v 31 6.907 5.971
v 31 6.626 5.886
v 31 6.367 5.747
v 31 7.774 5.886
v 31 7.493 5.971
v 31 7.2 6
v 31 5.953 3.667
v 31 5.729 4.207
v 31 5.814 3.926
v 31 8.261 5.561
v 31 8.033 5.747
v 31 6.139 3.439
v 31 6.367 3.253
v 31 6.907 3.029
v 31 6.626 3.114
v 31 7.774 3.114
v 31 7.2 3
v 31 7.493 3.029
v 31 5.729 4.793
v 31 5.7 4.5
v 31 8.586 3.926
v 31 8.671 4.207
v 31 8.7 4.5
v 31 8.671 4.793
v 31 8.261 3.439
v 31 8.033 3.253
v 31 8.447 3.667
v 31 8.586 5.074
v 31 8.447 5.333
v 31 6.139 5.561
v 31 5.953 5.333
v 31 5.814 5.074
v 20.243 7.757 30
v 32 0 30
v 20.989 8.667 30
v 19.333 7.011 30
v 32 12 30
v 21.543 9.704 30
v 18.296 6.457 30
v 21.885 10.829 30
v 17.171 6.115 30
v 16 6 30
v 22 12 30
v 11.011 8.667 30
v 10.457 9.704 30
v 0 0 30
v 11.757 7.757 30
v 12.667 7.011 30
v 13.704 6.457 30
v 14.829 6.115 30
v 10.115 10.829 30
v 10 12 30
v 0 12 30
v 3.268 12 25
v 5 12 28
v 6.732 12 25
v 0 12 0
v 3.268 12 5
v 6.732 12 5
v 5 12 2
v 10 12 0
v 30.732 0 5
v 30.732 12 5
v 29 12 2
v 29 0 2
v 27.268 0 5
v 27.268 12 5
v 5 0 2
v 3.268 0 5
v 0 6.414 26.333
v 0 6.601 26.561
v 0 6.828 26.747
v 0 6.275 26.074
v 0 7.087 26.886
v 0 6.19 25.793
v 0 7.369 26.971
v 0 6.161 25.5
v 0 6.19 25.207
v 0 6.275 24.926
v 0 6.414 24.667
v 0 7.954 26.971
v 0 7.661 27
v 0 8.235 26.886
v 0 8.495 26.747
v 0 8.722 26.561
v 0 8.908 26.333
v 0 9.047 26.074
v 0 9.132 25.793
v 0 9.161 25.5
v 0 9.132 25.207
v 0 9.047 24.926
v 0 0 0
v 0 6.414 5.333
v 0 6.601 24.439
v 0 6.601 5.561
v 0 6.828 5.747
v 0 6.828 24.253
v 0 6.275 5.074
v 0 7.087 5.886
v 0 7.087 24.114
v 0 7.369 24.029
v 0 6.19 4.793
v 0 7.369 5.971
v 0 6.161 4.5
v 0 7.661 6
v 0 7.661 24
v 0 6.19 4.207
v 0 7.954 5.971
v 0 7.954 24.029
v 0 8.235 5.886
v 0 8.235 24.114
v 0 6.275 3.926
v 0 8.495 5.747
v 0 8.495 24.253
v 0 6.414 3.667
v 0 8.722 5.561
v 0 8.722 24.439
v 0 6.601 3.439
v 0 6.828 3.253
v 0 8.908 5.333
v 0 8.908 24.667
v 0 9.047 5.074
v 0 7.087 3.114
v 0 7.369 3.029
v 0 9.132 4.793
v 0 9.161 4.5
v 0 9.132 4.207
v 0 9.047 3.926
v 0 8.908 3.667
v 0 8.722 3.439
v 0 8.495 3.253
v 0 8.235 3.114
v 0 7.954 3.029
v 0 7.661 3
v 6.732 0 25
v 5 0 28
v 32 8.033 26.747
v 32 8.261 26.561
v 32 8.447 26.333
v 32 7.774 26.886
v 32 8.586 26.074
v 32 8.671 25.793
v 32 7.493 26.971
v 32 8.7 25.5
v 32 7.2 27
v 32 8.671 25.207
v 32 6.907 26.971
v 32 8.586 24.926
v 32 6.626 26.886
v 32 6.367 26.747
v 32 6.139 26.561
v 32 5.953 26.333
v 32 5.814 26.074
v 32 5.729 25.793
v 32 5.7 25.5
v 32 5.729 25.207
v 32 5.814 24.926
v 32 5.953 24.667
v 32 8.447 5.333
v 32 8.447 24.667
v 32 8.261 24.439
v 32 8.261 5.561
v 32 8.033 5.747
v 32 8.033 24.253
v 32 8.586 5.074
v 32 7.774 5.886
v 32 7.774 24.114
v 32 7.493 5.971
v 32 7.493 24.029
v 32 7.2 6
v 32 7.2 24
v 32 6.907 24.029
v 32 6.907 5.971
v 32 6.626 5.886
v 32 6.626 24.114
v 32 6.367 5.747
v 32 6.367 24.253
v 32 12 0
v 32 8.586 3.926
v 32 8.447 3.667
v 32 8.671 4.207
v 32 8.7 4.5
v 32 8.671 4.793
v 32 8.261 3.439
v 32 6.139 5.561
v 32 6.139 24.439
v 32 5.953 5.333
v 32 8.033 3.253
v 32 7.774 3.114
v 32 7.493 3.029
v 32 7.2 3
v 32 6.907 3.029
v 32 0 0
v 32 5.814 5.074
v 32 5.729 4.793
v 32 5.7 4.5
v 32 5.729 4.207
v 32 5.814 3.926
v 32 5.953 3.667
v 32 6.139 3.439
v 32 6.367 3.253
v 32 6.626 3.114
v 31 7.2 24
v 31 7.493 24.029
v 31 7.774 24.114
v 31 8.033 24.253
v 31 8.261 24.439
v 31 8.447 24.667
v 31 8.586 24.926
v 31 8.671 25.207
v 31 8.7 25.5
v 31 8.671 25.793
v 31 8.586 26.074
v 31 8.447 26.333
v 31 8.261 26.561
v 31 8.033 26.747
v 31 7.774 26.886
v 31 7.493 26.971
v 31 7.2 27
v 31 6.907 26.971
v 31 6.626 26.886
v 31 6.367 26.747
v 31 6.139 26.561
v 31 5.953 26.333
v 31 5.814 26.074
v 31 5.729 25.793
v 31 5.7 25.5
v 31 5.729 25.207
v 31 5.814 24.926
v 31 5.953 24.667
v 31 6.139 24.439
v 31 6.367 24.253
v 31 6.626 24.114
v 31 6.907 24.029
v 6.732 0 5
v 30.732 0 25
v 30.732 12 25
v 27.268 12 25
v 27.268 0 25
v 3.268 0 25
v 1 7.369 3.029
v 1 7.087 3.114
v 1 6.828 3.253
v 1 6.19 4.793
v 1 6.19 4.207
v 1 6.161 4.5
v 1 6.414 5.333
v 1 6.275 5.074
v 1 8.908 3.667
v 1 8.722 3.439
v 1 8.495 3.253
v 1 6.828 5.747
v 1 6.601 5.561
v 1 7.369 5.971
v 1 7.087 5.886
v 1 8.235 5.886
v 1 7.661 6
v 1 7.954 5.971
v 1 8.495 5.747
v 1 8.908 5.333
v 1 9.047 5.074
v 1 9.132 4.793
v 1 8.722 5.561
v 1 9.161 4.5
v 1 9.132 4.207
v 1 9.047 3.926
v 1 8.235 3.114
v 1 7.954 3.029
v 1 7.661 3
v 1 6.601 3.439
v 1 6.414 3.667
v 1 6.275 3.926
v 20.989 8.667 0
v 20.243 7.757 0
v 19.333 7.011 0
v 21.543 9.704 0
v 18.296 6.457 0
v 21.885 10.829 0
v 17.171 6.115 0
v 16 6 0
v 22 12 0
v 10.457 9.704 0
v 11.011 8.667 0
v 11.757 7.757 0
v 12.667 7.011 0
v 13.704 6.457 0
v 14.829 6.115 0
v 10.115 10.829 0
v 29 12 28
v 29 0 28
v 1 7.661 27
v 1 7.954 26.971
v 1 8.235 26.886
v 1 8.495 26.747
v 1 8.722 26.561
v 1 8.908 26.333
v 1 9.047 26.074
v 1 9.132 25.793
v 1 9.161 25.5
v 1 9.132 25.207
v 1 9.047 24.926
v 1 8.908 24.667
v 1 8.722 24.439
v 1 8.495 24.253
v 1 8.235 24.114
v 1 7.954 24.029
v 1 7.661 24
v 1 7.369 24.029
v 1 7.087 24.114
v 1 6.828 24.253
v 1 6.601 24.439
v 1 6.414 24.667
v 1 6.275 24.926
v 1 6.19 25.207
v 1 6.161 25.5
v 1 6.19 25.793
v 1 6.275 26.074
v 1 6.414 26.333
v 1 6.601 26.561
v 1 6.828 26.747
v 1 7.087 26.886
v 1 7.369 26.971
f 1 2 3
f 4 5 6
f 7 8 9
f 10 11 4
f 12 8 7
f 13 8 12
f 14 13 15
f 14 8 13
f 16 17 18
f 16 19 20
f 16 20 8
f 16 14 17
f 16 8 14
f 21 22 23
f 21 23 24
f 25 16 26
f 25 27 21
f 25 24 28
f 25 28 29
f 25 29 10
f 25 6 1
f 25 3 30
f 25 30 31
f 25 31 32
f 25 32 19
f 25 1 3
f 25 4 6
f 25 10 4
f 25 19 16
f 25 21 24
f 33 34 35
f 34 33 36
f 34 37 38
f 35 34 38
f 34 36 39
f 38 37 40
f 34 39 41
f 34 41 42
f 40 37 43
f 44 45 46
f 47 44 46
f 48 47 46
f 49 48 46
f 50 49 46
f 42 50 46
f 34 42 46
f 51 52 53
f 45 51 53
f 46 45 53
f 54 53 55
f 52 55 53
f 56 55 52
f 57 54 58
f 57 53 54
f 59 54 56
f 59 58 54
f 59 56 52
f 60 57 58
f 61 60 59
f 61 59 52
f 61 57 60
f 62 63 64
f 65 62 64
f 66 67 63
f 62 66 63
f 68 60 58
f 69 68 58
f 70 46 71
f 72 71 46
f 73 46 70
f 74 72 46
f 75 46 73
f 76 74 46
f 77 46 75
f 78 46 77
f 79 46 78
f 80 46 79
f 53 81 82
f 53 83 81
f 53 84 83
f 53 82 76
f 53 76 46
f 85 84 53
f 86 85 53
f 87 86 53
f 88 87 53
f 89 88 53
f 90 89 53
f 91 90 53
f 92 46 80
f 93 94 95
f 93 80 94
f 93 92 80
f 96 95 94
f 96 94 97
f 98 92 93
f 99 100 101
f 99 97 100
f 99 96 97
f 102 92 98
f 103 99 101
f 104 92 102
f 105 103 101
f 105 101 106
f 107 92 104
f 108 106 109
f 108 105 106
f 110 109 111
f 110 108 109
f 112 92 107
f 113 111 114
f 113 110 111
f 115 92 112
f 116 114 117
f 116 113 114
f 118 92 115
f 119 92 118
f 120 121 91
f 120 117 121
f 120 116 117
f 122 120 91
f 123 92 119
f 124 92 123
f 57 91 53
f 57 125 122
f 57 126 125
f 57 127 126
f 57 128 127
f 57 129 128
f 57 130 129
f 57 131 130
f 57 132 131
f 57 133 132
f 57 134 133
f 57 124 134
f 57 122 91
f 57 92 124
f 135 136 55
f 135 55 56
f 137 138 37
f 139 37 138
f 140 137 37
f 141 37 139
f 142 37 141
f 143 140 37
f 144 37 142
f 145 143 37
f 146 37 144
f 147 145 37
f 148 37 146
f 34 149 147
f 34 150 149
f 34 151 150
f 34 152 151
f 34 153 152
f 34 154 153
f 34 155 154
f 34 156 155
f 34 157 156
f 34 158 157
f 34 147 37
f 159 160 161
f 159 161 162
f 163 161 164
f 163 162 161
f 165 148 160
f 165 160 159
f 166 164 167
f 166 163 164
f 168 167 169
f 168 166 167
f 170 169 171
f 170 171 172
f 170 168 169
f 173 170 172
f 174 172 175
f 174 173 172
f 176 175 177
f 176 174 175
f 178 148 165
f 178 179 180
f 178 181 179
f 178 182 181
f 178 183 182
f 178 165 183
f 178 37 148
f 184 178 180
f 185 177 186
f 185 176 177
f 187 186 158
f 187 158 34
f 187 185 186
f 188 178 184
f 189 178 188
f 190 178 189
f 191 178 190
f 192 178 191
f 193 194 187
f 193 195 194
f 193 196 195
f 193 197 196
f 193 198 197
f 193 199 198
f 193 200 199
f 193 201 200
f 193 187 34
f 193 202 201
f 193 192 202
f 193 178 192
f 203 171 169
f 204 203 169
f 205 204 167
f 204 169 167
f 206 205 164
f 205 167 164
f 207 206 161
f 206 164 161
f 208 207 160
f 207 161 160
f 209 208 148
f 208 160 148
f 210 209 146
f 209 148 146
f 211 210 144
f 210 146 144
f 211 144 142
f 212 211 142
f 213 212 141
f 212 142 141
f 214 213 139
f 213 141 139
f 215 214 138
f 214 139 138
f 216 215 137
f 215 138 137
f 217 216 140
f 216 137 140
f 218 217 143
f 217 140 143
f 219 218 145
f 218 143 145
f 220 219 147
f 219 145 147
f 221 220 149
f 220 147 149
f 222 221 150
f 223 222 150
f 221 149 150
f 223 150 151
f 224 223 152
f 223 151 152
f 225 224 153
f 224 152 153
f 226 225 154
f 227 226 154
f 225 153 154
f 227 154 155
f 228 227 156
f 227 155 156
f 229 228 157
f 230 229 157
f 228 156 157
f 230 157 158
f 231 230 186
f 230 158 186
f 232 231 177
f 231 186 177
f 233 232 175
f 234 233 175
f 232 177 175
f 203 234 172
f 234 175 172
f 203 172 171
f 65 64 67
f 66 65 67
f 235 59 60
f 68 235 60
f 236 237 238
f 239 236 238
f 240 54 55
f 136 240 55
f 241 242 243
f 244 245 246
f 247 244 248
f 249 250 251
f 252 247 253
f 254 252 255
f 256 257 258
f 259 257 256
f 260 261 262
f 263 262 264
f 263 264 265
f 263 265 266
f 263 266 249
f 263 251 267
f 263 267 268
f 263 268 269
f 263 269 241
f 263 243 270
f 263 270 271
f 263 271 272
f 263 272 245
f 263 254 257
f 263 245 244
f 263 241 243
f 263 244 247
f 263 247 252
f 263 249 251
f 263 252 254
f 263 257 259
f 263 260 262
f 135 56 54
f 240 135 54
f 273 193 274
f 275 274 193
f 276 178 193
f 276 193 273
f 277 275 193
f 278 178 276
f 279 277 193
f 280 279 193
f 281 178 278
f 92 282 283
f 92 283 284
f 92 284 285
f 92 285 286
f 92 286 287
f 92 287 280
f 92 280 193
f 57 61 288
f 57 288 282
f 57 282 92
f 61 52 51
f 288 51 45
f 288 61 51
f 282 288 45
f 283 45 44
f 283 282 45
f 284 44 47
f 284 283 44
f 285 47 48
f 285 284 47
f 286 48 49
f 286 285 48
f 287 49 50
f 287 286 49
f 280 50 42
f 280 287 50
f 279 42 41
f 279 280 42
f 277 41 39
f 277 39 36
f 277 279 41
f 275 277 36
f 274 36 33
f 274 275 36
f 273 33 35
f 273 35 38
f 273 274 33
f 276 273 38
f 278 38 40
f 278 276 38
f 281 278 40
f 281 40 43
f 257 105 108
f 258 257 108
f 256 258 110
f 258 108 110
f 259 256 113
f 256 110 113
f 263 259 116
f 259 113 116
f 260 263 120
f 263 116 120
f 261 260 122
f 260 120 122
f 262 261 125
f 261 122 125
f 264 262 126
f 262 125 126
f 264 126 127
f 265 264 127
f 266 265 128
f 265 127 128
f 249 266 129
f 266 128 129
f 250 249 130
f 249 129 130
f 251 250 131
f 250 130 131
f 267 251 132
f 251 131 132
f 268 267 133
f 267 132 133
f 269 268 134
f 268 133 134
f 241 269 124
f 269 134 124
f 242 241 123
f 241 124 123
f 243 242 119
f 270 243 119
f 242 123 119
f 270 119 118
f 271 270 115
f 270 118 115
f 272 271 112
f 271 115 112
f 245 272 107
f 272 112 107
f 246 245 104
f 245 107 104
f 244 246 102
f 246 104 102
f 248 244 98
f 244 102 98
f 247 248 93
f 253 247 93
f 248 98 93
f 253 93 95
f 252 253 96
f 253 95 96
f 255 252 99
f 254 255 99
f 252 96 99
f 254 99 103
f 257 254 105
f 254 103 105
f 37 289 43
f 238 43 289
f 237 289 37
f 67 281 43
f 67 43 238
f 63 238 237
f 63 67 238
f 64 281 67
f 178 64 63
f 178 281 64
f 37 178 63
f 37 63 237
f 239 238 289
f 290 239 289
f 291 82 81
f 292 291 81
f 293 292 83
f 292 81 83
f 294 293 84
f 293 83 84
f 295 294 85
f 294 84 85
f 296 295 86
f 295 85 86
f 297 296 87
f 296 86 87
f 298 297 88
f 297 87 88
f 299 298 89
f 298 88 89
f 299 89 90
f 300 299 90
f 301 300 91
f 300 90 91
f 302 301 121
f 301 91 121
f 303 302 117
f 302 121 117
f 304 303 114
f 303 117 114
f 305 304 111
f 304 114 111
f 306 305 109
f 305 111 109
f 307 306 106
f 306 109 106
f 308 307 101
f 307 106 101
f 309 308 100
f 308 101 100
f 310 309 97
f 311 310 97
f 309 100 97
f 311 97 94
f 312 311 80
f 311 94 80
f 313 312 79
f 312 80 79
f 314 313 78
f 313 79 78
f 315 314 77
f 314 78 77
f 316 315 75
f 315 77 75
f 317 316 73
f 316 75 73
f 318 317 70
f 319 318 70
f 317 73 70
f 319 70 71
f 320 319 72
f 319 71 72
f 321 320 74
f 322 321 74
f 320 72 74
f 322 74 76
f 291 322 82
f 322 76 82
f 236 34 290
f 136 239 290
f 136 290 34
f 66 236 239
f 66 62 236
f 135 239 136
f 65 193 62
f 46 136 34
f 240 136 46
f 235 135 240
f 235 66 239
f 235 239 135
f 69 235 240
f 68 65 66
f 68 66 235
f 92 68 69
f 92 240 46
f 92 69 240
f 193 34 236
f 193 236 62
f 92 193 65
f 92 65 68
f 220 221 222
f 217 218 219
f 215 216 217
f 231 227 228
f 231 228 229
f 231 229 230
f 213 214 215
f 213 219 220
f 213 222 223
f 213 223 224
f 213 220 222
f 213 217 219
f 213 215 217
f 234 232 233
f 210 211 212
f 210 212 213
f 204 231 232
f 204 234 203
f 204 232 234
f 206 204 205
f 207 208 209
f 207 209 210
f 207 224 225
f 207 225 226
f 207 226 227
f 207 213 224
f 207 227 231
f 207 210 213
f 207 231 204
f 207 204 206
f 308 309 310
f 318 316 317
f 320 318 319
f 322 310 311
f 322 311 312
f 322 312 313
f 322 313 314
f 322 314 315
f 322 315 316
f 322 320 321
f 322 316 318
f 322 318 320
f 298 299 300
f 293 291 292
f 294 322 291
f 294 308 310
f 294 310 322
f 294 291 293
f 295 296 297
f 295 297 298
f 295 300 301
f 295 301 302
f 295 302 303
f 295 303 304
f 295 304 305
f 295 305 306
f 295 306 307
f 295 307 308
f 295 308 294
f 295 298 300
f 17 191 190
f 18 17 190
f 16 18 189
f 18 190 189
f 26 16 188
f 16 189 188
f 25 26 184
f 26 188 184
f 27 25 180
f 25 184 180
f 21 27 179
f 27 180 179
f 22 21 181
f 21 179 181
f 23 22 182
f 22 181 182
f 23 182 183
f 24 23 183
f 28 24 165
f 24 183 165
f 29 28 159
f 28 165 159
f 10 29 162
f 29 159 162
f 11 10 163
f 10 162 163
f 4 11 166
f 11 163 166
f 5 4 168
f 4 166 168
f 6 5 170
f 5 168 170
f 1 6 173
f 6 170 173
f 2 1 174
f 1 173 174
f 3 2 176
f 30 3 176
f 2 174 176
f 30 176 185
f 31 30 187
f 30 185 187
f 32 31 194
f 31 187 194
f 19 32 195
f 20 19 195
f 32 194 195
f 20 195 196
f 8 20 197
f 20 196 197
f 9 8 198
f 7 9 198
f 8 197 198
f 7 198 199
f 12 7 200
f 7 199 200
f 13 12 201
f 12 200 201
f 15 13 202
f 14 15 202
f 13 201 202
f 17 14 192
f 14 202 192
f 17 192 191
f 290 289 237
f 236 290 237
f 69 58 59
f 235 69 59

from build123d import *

# Parameters (mm, degrees)
BOSS_EXTRUDE1_DEPTH = 30
CUT_EXTRUDE1_DEPTH  = 13
SKETCH5_R           = 1.5
CUT_EXTRUDE2_DEPTH  = 1
SKETCH6_R           = 1.5
CUT_EXTRUDE3_DEPTH  = 1


with BuildPart() as part:
    # Sketch1 → Boss-Extrude1 (new body)
    with BuildSketch(Plane.XY):
        with BuildLine():
            Line((0, 0), (0, 12))
            Line((0, 12), (10, 12))
            ThreePointArc((10, 12), (16, 6), (22, 12))
            Line((22, 12), (32, 12))
            Line((32, 12), (32, 0))
            Line((32, 0), (0, 0))
        make_face()
    extrude(amount=BOSS_EXTRUDE1_DEPTH)

    # Sketch4 → Cut-Extrude1 (cut, through all)
    with BuildSketch(Plane(origin=(0, 12, 0), x_dir=(1, 0, 0), z_dir=(0, 1, 0))):
        Polygon((5, -2), (3.267949192, -5), (6.732050808, -5), align=None)
        Polygon((5, -28), (6.732050808, -25), (3.267949192, -25), align=None)
        Polygon((29, -28), (30.732050808, -25), (27.267949192, -25), align=None)
        Polygon((29, -2), (27.267949192, -5), (30.732050808, -5), align=None)
    extrude(amount=-CUT_EXTRUDE1_DEPTH, mode=Mode.SUBTRACT)

    # Sketch5 → Cut-Extrude2 (cut)
    with BuildSketch(Plane(origin=(32, 0, 0), x_dir=(0, 0, -1), z_dir=(1, 0, 0))):
        with Locations((-25.5, 7.2)):
            Circle(SKETCH5_R)
        with Locations((-4.5, 7.2)):
            Circle(SKETCH5_R)
    extrude(amount=-CUT_EXTRUDE2_DEPTH, mode=Mode.SUBTRACT)

    # Sketch6 → Cut-Extrude3 (cut)
    with BuildSketch(Plane.ZY):
        with Locations((4.5, 7.661165518)):
            Circle(SKETCH6_R)
        with Locations((25.5, 7.661165518)):
            Circle(SKETCH6_R)
    extrude(amount=-CUT_EXTRUDE3_DEPTH, mode=Mode.SUBTRACT)


solid = part.part
